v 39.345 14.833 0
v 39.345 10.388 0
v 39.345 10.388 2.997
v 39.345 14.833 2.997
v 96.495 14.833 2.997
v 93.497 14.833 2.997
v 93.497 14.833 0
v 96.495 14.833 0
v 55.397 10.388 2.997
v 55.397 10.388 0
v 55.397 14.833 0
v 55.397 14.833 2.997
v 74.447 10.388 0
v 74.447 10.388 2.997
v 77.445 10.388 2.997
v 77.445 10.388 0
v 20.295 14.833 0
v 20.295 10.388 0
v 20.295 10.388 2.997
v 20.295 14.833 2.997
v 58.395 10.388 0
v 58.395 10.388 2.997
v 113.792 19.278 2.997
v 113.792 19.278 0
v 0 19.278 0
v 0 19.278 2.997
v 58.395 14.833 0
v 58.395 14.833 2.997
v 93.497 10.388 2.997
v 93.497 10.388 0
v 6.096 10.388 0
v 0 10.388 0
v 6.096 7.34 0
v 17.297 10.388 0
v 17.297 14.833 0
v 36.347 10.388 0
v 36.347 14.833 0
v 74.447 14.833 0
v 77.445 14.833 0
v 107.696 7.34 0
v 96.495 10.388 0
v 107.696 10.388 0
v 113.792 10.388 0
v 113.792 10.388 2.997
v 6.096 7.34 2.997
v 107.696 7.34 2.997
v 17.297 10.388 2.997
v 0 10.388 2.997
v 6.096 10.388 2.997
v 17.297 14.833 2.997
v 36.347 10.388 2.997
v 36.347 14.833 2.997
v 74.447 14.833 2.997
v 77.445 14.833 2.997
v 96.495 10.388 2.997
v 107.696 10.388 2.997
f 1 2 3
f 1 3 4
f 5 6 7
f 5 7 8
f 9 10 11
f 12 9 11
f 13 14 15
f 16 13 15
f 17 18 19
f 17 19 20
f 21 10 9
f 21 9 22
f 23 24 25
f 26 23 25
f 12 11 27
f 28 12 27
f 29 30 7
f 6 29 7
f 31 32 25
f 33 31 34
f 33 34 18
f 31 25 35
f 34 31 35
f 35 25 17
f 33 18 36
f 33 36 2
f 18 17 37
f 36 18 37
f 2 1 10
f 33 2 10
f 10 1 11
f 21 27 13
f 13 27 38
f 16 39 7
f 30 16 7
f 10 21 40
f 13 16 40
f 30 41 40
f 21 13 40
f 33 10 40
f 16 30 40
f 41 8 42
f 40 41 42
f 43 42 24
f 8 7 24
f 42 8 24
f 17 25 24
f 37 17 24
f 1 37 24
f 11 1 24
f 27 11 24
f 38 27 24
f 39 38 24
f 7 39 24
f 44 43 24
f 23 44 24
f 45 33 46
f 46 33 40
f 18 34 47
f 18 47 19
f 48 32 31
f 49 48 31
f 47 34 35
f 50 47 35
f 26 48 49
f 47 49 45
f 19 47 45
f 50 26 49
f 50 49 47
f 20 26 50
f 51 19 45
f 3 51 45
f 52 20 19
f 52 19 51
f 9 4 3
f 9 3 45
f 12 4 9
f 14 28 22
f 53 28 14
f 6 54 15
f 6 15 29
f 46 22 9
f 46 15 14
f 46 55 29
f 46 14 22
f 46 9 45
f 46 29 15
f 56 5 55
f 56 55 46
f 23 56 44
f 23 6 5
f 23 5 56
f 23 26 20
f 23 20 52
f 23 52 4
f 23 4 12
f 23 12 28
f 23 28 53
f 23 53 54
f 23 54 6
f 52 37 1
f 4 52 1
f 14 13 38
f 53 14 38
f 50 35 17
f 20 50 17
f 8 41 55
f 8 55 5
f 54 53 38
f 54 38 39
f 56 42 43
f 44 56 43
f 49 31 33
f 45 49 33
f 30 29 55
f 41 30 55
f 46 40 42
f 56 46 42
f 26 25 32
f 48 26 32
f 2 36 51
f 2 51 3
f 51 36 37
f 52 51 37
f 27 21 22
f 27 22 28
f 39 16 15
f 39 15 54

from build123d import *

# Parameters (mm, degrees)
SKETCH1_W           = 2.9972
SKETCH1_H           = 4.445
BOSS_EXTRUDE1_DEPTH = 2.9972


with BuildPart() as part:
    # Sketch1 → Boss-Extrude1 (new body)
    with BuildSketch(Plane.XY):
        Polygon((0, 19.2778), (0, 10.3878), (6.096, 10.3878), (6.096, 7.3398), (107.696, 7.3398), (107.696, 10.3878), (113.792, 10.3878), (113.792, 19.2778), (107.696, 19.2778), (6.096, 19.2778), align=None)
        with Locations((18.796, 12.6103)):
            Rectangle(SKETCH1_W, SKETCH1_H, mode=Mode.SUBTRACT)
        with Locations((37.846, 12.6103)):
            Rectangle(SKETCH1_W, SKETCH1_H, mode=Mode.SUBTRACT)
        with Locations((56.896, 12.6103)):
            Rectangle(SKETCH1_W, SKETCH1_H, mode=Mode.SUBTRACT)
        with Locations((75.946, 12.6103)):
            Rectangle(SKETCH1_W, SKETCH1_H, mode=Mode.SUBTRACT)
        with Locations((94.996, 12.6103)):
            Rectangle(SKETCH1_W, SKETCH1_H, mode=Mode.SUBTRACT)
    extrude(amount=BOSS_EXTRUDE1_DEPTH)


solid = part.part
